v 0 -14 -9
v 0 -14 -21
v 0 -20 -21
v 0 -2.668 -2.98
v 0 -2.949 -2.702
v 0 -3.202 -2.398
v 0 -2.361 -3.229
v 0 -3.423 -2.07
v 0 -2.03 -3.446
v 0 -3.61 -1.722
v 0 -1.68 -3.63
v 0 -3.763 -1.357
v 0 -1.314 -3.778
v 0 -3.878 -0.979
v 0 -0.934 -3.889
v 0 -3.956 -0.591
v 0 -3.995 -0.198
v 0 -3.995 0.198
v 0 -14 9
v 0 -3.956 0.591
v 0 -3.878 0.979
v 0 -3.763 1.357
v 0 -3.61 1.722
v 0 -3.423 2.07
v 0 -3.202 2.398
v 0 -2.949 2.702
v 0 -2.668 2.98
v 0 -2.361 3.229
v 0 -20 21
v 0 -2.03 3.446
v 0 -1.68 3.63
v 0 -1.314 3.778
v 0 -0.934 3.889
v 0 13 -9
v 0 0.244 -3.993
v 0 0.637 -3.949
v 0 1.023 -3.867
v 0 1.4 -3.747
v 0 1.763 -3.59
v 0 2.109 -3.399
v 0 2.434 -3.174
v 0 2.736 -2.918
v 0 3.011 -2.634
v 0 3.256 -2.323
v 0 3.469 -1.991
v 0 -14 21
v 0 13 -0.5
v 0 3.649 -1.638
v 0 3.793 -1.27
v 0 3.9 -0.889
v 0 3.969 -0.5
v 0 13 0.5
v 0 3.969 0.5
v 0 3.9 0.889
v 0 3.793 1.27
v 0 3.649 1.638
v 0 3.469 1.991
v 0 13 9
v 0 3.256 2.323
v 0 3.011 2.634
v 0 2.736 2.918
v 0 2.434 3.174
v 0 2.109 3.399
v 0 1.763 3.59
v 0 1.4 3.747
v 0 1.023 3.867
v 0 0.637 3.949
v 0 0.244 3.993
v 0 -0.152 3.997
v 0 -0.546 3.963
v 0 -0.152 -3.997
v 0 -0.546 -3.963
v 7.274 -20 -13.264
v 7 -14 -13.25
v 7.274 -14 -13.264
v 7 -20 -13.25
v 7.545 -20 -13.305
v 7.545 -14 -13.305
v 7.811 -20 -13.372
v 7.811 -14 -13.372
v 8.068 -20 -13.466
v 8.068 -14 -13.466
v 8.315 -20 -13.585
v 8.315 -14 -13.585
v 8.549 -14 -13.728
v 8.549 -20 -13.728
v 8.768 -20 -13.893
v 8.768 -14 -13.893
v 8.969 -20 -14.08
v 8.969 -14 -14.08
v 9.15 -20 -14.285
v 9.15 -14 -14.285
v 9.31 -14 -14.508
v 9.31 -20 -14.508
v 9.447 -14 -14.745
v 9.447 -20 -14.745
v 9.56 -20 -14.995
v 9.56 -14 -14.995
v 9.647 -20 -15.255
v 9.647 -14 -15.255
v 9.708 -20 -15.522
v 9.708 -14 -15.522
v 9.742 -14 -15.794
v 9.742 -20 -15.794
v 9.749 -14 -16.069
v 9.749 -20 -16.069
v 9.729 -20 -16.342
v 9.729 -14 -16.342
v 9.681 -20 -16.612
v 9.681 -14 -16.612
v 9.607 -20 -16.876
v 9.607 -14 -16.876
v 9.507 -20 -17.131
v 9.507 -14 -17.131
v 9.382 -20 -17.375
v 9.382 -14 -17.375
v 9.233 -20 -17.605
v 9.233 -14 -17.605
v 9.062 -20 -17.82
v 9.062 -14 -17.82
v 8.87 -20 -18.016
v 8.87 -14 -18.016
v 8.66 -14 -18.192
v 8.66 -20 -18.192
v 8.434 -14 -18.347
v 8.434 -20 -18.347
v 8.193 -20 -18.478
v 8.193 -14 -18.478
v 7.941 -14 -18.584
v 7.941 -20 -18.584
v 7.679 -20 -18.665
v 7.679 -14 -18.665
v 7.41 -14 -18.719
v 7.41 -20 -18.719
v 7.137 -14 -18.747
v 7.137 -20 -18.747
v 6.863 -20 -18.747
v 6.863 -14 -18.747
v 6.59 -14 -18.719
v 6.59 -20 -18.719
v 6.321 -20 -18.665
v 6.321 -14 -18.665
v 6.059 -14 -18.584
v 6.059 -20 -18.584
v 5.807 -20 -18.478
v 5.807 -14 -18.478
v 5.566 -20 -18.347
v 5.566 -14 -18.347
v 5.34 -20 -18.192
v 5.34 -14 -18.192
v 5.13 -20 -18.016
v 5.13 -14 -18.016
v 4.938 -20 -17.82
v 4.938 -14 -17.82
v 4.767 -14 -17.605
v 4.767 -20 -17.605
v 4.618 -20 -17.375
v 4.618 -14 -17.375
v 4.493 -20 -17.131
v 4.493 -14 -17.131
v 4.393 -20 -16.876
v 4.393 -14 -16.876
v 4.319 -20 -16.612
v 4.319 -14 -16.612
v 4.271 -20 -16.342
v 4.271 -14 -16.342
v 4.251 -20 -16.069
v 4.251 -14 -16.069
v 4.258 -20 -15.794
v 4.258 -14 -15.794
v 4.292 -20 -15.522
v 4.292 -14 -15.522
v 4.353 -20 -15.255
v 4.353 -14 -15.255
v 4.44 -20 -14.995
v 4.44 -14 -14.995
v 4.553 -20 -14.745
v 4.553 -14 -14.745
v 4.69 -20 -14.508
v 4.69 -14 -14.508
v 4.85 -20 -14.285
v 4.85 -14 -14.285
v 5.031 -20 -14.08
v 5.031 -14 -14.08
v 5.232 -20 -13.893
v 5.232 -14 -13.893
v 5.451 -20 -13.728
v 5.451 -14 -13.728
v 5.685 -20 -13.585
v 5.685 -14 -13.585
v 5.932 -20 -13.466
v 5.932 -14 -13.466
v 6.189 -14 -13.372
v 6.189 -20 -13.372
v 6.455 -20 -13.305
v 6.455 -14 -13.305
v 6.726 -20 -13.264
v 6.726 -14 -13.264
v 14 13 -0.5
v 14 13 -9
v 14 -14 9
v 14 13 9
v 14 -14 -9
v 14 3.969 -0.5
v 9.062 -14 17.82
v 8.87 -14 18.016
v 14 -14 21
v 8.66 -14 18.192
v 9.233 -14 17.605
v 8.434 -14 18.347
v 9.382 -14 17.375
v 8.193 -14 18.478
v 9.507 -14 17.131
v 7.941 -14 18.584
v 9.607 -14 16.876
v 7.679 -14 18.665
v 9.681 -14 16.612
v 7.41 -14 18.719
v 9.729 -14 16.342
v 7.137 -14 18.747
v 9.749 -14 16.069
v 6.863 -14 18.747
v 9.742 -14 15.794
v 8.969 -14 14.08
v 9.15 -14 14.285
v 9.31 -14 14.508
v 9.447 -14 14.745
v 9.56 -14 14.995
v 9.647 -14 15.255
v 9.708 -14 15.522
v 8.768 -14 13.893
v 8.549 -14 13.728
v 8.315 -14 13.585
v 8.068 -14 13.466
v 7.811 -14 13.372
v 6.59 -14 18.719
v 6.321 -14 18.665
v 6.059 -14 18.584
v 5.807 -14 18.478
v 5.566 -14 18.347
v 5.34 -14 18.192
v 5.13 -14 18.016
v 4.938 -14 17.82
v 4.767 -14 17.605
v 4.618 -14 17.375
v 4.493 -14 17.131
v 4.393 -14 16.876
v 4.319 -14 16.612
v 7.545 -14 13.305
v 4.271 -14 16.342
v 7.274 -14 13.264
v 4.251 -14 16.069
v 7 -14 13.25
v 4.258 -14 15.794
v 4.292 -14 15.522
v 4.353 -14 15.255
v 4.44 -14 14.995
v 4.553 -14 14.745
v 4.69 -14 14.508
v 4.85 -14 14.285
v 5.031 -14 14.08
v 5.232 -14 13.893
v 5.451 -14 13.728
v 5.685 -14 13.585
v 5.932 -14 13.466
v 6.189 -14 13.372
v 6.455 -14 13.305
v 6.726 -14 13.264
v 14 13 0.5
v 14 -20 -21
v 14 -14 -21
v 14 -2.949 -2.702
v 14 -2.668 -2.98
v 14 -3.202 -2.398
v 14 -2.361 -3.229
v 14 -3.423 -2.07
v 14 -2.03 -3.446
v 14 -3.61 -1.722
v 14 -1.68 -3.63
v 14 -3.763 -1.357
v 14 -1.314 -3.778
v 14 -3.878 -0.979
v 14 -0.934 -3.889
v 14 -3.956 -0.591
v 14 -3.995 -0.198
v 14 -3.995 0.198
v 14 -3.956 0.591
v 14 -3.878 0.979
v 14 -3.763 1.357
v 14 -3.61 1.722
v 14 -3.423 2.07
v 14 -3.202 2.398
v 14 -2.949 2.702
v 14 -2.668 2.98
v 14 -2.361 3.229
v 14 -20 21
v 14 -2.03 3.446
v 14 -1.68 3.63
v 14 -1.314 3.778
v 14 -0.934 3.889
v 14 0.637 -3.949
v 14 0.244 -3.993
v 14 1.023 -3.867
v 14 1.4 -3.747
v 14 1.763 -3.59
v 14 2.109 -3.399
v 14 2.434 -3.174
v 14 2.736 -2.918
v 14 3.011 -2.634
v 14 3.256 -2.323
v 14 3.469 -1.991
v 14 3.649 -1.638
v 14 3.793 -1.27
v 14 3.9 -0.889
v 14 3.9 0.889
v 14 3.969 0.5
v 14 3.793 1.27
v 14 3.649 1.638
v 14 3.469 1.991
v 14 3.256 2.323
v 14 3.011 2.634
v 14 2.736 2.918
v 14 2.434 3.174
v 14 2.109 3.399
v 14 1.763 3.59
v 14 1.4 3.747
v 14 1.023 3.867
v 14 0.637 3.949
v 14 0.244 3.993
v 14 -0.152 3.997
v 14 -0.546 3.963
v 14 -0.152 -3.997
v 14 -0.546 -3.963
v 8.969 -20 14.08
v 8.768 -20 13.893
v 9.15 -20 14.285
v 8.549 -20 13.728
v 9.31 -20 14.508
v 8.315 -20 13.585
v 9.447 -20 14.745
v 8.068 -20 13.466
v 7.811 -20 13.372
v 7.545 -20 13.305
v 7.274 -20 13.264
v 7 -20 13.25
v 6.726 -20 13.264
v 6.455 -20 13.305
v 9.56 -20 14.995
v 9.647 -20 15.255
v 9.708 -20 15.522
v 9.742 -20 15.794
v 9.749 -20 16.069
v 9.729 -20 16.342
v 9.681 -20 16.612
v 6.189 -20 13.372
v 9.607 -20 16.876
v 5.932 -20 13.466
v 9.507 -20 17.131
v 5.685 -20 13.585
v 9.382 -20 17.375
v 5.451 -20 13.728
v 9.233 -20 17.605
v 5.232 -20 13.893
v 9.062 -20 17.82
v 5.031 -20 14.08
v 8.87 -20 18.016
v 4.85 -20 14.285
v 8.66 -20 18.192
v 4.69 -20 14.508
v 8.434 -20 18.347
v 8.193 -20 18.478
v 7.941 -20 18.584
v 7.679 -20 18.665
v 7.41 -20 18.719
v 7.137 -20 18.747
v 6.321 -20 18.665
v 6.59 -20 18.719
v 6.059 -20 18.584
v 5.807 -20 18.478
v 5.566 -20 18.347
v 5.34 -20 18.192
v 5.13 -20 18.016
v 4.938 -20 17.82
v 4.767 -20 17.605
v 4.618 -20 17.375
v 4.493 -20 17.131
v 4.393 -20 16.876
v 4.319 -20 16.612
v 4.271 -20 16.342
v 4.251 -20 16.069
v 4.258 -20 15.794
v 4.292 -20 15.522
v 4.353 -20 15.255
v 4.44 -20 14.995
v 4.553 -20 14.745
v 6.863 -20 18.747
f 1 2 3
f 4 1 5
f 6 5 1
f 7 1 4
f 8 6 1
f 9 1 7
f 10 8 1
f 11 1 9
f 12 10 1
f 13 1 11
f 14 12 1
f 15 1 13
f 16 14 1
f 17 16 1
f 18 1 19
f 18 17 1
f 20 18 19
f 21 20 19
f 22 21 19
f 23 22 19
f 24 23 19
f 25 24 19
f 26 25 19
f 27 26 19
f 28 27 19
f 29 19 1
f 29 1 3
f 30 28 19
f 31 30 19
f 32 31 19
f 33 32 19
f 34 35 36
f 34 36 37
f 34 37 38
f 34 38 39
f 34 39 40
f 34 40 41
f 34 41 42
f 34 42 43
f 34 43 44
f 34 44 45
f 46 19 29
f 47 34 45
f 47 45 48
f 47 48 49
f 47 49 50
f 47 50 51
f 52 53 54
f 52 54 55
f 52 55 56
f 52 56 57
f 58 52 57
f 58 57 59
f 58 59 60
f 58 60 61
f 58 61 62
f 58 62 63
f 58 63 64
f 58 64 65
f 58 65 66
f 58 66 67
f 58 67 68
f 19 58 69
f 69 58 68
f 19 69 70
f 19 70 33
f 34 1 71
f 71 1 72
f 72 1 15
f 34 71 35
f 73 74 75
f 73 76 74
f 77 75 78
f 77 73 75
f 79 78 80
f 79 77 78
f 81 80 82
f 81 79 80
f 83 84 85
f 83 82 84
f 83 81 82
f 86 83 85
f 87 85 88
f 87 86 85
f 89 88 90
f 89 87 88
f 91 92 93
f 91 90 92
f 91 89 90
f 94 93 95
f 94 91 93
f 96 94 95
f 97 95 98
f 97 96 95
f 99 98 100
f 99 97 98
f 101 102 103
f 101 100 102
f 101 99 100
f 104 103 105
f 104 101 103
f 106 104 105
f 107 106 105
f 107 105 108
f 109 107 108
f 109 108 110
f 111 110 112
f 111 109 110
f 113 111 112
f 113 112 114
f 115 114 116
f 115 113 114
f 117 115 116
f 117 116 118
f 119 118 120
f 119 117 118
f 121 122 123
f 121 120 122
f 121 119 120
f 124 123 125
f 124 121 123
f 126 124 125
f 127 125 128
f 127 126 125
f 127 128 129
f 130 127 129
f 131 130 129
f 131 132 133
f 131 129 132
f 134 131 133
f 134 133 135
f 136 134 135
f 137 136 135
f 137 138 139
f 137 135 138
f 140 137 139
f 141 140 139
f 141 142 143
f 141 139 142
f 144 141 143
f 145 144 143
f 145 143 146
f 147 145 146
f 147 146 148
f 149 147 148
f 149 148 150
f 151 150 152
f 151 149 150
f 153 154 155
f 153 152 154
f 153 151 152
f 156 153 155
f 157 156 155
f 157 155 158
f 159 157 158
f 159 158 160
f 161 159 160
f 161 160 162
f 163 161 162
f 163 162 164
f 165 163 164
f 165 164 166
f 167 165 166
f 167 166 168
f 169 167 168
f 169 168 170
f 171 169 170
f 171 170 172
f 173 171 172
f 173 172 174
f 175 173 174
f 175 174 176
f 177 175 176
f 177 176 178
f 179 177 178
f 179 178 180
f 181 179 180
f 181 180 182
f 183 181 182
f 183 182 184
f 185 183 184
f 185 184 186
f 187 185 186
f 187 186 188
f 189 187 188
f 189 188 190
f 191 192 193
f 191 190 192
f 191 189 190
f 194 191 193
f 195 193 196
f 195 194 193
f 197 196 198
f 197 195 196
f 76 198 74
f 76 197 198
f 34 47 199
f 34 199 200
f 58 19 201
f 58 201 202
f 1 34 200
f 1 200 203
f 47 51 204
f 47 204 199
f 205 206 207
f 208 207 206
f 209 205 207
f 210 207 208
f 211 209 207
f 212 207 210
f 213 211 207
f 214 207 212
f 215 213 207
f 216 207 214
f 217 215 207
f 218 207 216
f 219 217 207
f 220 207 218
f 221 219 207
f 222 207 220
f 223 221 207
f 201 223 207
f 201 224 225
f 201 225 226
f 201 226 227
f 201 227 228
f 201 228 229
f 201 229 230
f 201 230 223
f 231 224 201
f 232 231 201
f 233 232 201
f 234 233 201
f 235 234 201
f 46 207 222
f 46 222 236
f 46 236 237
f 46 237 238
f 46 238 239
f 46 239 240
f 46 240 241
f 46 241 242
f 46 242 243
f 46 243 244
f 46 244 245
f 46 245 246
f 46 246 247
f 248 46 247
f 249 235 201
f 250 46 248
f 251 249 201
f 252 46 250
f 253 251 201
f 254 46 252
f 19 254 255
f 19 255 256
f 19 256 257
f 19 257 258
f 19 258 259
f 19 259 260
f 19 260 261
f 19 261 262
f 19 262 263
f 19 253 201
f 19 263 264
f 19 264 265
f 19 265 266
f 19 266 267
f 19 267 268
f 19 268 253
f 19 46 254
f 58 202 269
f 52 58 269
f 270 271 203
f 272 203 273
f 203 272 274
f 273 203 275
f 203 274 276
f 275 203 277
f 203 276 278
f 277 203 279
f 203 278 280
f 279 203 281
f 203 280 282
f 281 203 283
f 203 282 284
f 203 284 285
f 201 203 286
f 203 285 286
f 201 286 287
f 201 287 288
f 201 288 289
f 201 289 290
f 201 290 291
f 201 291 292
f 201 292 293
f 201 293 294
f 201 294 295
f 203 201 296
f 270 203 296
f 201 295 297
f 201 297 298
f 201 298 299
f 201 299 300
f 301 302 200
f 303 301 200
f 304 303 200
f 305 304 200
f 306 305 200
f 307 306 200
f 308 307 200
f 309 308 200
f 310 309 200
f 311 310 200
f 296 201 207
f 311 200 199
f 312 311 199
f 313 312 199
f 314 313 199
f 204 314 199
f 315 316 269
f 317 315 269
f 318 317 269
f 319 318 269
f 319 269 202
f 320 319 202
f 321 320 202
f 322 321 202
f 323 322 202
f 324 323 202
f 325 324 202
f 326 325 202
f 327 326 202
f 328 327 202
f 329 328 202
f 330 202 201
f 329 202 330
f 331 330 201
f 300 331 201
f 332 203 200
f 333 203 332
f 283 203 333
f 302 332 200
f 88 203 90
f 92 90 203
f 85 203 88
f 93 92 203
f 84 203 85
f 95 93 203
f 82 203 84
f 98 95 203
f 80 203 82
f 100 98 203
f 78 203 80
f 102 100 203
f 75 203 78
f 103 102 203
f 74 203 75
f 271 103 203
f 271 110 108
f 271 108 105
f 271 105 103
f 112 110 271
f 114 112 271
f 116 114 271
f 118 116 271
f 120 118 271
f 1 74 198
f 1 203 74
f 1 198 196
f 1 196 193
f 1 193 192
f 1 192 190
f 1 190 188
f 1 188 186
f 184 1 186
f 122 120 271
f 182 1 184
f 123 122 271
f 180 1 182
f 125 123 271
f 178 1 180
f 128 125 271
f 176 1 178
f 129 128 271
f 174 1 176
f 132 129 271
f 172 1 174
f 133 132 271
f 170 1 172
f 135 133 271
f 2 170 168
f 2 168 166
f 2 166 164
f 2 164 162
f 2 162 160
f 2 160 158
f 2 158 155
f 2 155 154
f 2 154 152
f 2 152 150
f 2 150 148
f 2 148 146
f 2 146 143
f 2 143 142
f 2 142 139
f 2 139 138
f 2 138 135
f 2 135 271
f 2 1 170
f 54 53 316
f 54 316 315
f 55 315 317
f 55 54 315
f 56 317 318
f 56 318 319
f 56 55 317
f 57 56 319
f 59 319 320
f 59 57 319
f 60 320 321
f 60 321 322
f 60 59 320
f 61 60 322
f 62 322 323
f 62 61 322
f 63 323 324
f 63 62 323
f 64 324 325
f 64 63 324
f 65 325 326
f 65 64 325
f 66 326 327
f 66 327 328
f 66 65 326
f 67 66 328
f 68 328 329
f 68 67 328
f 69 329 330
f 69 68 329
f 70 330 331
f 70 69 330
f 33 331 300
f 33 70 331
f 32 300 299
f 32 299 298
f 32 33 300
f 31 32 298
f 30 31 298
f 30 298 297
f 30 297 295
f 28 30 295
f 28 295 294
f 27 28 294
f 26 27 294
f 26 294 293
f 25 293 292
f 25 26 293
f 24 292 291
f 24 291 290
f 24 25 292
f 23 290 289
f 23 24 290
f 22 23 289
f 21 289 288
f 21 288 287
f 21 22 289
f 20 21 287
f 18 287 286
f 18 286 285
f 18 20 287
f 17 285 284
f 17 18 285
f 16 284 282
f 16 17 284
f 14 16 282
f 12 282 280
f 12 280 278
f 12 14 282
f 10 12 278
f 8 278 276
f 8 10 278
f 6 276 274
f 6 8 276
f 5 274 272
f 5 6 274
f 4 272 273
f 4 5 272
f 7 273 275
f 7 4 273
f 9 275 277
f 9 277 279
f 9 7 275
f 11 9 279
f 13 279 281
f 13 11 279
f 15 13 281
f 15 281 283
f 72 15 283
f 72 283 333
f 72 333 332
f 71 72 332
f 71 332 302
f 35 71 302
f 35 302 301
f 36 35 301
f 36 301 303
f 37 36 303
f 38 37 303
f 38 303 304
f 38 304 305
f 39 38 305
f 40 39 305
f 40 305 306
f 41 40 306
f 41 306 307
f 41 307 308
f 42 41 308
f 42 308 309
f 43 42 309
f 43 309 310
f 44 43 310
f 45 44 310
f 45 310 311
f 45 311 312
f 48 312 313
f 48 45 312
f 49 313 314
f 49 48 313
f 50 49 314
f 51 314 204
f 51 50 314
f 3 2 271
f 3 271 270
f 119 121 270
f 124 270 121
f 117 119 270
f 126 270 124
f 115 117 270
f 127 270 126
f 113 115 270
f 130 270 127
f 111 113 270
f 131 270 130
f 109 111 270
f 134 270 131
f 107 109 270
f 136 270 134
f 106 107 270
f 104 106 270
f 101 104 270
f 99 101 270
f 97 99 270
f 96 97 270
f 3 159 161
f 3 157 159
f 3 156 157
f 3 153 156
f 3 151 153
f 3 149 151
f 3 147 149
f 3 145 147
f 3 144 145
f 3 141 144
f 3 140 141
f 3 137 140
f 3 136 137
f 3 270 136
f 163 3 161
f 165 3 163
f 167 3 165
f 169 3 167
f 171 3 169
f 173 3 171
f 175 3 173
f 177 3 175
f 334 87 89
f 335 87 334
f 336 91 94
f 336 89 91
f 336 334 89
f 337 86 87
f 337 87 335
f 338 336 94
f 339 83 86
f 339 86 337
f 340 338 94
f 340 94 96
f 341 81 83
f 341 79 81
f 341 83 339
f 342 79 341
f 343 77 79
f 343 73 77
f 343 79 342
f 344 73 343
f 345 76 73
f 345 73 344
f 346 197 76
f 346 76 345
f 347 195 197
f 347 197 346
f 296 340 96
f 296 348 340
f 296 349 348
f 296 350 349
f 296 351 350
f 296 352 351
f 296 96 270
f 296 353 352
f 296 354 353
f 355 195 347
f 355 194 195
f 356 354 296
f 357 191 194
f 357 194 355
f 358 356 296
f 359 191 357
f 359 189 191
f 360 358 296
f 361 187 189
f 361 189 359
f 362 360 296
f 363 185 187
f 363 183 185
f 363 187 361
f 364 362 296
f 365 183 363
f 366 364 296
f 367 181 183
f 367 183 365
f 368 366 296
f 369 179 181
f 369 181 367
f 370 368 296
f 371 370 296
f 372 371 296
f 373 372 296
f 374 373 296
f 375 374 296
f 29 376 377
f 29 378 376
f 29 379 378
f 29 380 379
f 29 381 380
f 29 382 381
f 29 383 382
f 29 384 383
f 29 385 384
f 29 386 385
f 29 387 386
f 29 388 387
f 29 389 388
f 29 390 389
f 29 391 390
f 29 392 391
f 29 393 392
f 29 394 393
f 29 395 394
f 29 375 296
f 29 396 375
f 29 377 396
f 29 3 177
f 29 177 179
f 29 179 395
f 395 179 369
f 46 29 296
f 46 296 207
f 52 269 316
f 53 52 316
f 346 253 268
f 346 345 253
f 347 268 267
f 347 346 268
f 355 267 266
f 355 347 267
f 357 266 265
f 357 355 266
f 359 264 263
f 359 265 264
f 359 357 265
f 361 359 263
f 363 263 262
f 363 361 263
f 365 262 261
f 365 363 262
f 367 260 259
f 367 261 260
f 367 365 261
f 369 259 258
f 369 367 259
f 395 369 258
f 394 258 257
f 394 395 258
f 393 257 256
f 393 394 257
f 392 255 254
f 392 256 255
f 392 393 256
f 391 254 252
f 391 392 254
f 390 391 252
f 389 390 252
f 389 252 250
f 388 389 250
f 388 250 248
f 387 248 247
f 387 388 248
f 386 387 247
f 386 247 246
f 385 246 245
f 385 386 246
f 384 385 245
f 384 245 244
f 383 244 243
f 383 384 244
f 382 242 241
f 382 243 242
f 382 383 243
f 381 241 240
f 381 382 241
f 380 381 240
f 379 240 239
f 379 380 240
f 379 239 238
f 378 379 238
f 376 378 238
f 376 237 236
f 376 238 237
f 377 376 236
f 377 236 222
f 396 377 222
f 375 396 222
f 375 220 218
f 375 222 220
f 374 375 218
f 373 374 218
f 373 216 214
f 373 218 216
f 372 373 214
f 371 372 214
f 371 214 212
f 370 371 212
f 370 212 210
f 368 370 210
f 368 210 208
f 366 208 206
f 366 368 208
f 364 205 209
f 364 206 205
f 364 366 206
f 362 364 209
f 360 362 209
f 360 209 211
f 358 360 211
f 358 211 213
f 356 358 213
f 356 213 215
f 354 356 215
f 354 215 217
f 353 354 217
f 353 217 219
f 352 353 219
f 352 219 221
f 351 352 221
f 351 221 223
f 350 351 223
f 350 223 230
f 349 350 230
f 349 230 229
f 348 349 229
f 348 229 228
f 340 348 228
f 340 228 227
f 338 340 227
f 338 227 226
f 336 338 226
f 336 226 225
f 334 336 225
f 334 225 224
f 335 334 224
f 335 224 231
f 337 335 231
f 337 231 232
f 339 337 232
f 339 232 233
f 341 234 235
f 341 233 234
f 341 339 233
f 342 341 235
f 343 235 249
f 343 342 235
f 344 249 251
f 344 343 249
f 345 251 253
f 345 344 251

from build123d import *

# Parameters (mm, degrees)
BOSS_EXTRUDE1_DEPTH     = 14
CUT_EXTRUDE1_DEPTH      = 37.959437225
CUT_EXTRUDE1_DEPTH_BACK = 37.959437225
SKETCH2_R               = 2.75


with BuildPart() as part:
    # Sketch1 → Boss-Extrude1 (new body)
    with BuildSketch(Plane(origin=(0, 0, 0), x_dir=(0, 0, -1), z_dir=(1, 0, 0))):
        with BuildLine():
            Line((21, -20), (-21, -20))
            Line((-21, -20), (-21, -14))
            Line((-21, -14), (-9, -14))
            Line((-9, -14), (-9, 13))
            Line((-9, 13), (-0.5, 13))
            Line((-0.5, 13), (-0.5, 3.968626967))
            ThreePointArc((-0.5, 3.968626967), (0, -4), (0.5, 3.968626967))
            Line((0.5, 3.968626967), (0.5, 13))
            Line((0.5, 13), (9, 13))
            Line((9, 13), (9, -14))
            Line((9, -14), (21, -14))
            Line((21, -14), (21, -20))
        make_face()
    extrude(amount=BOSS_EXTRUDE1_DEPTH)

    # Sketch2 → Cut-Extrude1 (cut, two sides: drawn at the far end of the back side and taken through both)
    with BuildSketch(Plane(origin=(0, -14, 0), x_dir=(1, 0, 0), z_dir=(0, 1, 0)).offset(-CUT_EXTRUDE1_DEPTH_BACK)):
        with Locations(Location((7, 16, 0), (0, 0, 270))):
            Circle(SKETCH2_R)
        with Locations(Location((7, -16, 0), (0, 0, 90))):
            Circle(SKETCH2_R)
    extrude(amount=CUT_EXTRUDE1_DEPTH + CUT_EXTRUDE1_DEPTH_BACK, mode=Mode.SUBTRACT)


solid = part.part
